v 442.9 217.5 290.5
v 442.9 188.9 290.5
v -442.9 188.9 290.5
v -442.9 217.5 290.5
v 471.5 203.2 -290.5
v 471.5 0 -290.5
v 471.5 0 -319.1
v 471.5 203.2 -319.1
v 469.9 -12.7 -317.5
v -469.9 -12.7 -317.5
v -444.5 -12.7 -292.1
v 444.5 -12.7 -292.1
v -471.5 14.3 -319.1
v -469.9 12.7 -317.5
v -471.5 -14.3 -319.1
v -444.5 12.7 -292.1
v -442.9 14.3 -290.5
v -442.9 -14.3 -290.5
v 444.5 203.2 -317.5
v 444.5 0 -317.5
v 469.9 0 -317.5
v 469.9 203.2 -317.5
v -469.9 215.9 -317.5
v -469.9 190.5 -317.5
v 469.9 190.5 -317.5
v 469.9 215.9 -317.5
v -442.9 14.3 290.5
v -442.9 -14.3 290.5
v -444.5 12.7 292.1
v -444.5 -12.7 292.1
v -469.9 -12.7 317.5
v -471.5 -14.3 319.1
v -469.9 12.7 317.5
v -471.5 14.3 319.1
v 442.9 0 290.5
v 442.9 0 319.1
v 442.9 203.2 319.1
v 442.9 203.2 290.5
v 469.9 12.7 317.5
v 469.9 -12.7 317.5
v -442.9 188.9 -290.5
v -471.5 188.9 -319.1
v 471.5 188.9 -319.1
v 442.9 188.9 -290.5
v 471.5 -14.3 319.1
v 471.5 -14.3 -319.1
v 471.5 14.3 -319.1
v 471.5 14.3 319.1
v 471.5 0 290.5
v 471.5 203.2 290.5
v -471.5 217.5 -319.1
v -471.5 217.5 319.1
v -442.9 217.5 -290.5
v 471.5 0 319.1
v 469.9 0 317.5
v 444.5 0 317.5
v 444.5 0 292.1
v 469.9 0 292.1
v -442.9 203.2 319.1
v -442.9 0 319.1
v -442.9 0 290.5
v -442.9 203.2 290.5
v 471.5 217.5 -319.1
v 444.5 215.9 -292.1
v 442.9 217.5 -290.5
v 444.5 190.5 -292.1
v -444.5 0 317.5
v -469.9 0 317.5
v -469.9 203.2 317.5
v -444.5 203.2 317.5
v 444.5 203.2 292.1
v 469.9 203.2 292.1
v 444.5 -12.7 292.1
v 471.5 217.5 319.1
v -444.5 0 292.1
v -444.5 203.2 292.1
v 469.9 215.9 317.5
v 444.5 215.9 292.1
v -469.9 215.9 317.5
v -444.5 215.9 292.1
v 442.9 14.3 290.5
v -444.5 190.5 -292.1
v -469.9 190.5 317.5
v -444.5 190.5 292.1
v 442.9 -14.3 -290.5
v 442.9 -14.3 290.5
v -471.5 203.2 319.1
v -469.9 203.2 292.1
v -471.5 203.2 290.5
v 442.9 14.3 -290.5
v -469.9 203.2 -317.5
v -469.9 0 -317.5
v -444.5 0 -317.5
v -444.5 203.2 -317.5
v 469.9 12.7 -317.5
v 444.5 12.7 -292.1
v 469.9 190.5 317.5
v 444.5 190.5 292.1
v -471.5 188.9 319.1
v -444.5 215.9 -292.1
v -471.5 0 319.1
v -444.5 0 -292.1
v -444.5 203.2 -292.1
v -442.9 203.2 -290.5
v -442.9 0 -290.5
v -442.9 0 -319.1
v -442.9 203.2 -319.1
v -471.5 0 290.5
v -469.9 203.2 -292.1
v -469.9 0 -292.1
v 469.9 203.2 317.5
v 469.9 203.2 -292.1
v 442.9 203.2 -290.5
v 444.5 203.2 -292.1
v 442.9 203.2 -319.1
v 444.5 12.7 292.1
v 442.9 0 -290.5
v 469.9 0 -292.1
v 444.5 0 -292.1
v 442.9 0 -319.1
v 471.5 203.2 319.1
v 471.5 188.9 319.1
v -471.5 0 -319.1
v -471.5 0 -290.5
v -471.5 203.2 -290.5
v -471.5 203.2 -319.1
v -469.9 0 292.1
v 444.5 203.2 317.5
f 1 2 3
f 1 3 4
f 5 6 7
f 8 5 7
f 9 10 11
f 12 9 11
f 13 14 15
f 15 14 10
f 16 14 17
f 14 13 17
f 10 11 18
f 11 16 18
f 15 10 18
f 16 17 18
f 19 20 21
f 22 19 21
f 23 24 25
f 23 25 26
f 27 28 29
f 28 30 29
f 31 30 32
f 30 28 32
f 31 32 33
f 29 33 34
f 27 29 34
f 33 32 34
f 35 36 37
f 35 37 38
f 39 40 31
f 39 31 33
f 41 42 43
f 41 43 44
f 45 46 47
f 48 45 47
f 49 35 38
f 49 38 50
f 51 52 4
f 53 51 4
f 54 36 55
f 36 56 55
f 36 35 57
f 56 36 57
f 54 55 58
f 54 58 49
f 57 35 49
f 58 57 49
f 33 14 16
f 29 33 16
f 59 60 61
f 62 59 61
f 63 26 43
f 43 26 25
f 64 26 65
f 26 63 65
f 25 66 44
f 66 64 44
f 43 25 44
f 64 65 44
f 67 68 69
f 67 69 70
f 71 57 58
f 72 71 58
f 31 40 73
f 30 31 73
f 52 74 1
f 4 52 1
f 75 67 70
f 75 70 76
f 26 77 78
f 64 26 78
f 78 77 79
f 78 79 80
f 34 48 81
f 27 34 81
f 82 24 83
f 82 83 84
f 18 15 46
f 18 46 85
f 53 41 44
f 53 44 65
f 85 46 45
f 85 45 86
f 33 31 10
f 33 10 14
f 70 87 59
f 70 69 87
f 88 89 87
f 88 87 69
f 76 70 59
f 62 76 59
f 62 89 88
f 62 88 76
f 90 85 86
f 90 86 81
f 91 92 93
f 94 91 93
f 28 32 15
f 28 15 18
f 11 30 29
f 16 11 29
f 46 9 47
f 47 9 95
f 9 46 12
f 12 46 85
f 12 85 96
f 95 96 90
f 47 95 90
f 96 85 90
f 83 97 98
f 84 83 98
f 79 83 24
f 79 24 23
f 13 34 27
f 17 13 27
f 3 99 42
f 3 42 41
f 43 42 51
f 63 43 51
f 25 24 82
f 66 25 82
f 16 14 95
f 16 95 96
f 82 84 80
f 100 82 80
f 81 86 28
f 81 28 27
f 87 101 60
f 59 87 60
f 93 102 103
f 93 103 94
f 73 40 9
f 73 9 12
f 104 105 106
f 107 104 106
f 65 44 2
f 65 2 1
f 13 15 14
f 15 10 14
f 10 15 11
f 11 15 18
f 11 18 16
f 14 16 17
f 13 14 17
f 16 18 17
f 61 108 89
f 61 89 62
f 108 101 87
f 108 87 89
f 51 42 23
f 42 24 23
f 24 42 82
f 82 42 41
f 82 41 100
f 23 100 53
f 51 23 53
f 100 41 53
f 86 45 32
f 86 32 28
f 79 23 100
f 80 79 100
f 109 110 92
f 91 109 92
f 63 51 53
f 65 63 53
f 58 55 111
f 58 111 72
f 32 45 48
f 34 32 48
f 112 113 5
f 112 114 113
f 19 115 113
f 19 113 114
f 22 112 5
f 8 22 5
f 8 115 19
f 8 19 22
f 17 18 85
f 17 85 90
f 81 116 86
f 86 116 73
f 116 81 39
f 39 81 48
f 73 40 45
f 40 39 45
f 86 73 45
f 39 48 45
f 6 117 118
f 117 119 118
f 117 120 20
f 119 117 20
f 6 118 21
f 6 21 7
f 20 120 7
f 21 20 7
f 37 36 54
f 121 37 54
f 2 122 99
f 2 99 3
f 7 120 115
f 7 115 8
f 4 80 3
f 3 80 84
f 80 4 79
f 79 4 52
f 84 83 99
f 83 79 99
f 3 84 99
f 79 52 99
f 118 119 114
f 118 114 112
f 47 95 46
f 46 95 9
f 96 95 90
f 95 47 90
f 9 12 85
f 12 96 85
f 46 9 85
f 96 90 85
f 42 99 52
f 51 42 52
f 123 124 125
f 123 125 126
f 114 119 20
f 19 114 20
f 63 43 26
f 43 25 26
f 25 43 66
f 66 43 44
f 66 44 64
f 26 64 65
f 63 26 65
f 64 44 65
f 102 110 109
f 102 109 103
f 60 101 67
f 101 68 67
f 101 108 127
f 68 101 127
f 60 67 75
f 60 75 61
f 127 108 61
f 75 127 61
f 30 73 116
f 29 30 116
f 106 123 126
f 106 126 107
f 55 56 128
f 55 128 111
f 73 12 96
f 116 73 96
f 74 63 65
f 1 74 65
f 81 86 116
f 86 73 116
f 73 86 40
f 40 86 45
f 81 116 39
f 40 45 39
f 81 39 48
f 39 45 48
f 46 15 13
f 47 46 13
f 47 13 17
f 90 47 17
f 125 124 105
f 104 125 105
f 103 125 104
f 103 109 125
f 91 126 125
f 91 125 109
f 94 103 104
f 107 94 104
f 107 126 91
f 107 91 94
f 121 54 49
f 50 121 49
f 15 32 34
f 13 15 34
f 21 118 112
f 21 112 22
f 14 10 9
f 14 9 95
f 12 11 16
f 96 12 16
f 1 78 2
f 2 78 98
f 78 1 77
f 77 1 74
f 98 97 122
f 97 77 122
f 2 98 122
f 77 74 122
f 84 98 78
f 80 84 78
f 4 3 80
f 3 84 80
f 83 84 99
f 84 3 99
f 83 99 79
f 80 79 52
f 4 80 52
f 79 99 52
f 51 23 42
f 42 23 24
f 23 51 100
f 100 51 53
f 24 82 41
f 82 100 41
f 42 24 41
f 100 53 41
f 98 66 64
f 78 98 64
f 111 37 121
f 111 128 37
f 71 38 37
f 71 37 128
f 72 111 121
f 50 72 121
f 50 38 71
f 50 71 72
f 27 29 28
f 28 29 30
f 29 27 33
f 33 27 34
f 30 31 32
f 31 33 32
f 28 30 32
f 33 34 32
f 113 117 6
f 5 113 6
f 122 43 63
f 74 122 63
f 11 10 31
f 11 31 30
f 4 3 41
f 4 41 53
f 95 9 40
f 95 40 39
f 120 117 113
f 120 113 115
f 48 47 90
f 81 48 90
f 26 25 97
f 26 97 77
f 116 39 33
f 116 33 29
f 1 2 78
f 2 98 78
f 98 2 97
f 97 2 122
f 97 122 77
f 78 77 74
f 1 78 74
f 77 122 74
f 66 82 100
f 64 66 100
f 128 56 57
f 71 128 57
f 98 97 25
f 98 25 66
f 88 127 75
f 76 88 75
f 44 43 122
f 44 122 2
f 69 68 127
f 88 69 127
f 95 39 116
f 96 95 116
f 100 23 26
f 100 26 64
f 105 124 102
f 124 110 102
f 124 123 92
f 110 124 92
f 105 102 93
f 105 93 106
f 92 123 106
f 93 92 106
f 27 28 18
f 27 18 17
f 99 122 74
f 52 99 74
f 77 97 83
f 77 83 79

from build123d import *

# Parameters (mm, degrees)
SQUARE_TUBE_25_4X25_4X1_6_IGVC_1_DEPTH      = 935.623253942
SQUARE_TUBE_25_4X25_4X1_6_IGVC_1_DEPTH_BACK = 21.223253942
SKETCH14_W                                  = 28.6
SKETCH14_H                                  = 28.6
SKETCH14_W_2                                = 25.4
SKETCH14_H_2                                = 25.4
SKETCH14_ON_SEGMENT_2_W                     = 28.6
SKETCH14_ON_SEGMENT_2_H                     = 28.6
SKETCH14_ON_SEGMENT_2_W_2                   = 25.4
SKETCH14_ON_SEGMENT_2_H_2                   = 25.4
SQUARE_TUBE_25_4X25_4X1_6_IGVC_1_2_DEPTH    = 652.046507884
SKETCH14_ON_SEGMENT_3_W                     = 28.6
SKETCH14_ON_SEGMENT_3_H                     = 28.6
SKETCH14_ON_SEGMENT_3_W_2                   = 25.4
SKETCH14_ON_SEGMENT_3_H_2                   = 25.4
SQUARE_TUBE_25_4X25_4X1_6_IGVC_1_3_DEPTH    = 956.846507884
SKETCH14_ON_SEGMENT_4_W                     = 28.6
SKETCH14_ON_SEGMENT_4_H                     = 28.6
SKETCH14_ON_SEGMENT_4_W_2                   = 25.4
SKETCH14_ON_SEGMENT_4_H_2                   = 25.4
SQUARE_TUBE_25_4X25_4X1_6_IGVC_1_4_DEPTH    = 652.046507884
SKETCH15_W                                  = 28.6
SKETCH15_H                                  = 28.6
SKETCH15_W_2                                = 25.4
SKETCH15_H_2                                = 25.4
SQUARE_TUBE_25_4X25_4X1_6_IGVC_2_DEPTH      = 203.2
SKETCH15_ON_SEGMENT_2_W                     = 28.6
SKETCH15_ON_SEGMENT_2_H                     = 28.6
SKETCH15_ON_SEGMENT_2_W_2                   = 25.4
SKETCH15_ON_SEGMENT_2_H_2                   = 25.4
SQUARE_TUBE_25_4X25_4X1_6_IGVC_2_2_DEPTH    = 203.2
SKETCH15_ON_SEGMENT_3_W                     = 28.6
SKETCH15_ON_SEGMENT_3_H                     = 28.6
SKETCH15_ON_SEGMENT_3_W_2                   = 25.4
SKETCH15_ON_SEGMENT_3_H_2                   = 25.4
SQUARE_TUBE_25_4X25_4X1_6_IGVC_2_3_DEPTH    = 203.2
SKETCH15_ON_SEGMENT_4_W                     = 28.6
SKETCH15_ON_SEGMENT_4_H                     = 28.6
SKETCH15_ON_SEGMENT_4_W_2                   = 25.4
SKETCH15_ON_SEGMENT_4_H_2                   = 25.4
SQUARE_TUBE_25_4X25_4X1_6_IGVC_2_4_DEPTH    = 203.2
SQUARE_TUBE_25_4X25_4X1_6_IGVC_3_DEPTH      = 630.823253942
SQUARE_TUBE_25_4X25_4X1_6_IGVC_3_DEPTH_BACK = 21.223253942
SKETCH16_W                                  = 28.6
SKETCH16_H                                  = 28.6
SKETCH16_W_2                                = 25.4
SKETCH16_H_2                                = 25.4
SKETCH16_ON_SEGMENT_2_W                     = 28.6
SKETCH16_ON_SEGMENT_2_H                     = 28.6
SKETCH16_ON_SEGMENT_2_W_2                   = 25.4
SKETCH16_ON_SEGMENT_2_H_2                   = 25.4
SQUARE_TUBE_25_4X25_4X1_6_IGVC_3_2_DEPTH    = 956.846507884
SKETCH16_ON_SEGMENT_3_W                     = 28.6
SKETCH16_ON_SEGMENT_3_H                     = 28.6
SKETCH16_ON_SEGMENT_3_W_2                   = 25.4
SKETCH16_ON_SEGMENT_3_H_2                   = 25.4
SQUARE_TUBE_25_4X25_4X1_6_IGVC_3_3_DEPTH    = 652.046507884
SKETCH16_ON_SEGMENT_4_W                     = 28.6
SKETCH16_ON_SEGMENT_4_H                     = 28.6
SKETCH16_ON_SEGMENT_4_W_2                   = 25.4
SKETCH16_ON_SEGMENT_4_H_2                   = 25.4
SQUARE_TUBE_25_4X25_4X1_6_IGVC_3_4_DEPTH    = 956.846507884


with BuildPart() as part:
    # Sketch14 → Square tube 25.4X25.4X1.6_IGVC(1) (new, two sides: drawn at the far end of the back side and taken through both)
    with BuildSketch(Plane(origin=(-457.2, 0, 304.8), x_dir=(0, 0, -1), z_dir=(1, 0, 0)).offset(-SQUARE_TUBE_25_4X25_4X1_6_IGVC_1_DEPTH_BACK)):
        Rectangle(SKETCH14_W, SKETCH14_H)
        Rectangle(SKETCH14_W_2, SKETCH14_H_2, mode=Mode.SUBTRACT)
    extrude(amount=SQUARE_TUBE_25_4X25_4X1_6_IGVC_1_DEPTH + SQUARE_TUBE_25_4X25_4X1_6_IGVC_1_DEPTH_BACK)

    # Square tube 25.4X25.4X1.6_IGVC(1) mitre 1
    split(bisect_by=Plane(origin=(-457.2, 0, 304.8), x_dir=(0, 1, 0), z_dir=(0.707106781, 0, 0.707106781)), keep=Keep.TOP)

    # Square tube 25.4X25.4X1.6_IGVC(1) mitre 2
    split(bisect_by=Plane(origin=(457.2, 0, 304.8), x_dir=(0, -1, 0), z_dir=(-0.707106781, 0, 0.707106781)), keep=Keep.TOP)


with BuildPart() as body_2:
    # Sketch14 on segment 2 (carried to segment 2) → Square tube 25.4X25.4X1.6_IGVC_1 2 (new body)
    with BuildSketch(Plane(origin=(457.2, 0, 326.023253942), x_dir=(-1, 0, 0), z_dir=(0, 0, -1))):
        Rectangle(SKETCH14_ON_SEGMENT_2_W, SKETCH14_ON_SEGMENT_2_H)
        Rectangle(SKETCH14_ON_SEGMENT_2_W_2, SKETCH14_ON_SEGMENT_2_H_2, mode=Mode.SUBTRACT)
    extrude(amount=SQUARE_TUBE_25_4X25_4X1_6_IGVC_1_2_DEPTH)

    # Square tube 25.4X25.4X1.6_IGVC_1 2 mitre
    split(bisect_by=Plane(origin=(457.2, 0, -304.8), x_dir=(0, 1, 0), z_dir=(0.707106781, 0, 0.707106781)), keep=Keep.TOP)

    # Square tube 25.4X25.4X1.6_IGVC_1 2 m 2
    split(bisect_by=Plane(origin=(457.2, 0, 304.8), x_dir=(0, 1, 0), z_dir=(0.707106781, 0, -0.707106781)), keep=Keep.TOP)


with BuildPart() as body_3:
    # Sketch14 on segment 3 (carried to segment 3) → Square tube 25.4X25.4X1.6_IGVC_1 3 (new body)
    with BuildSketch(Plane(origin=(478.423253942, 0, -304.8), x_dir=(0, 0, 1), z_dir=(-1, 0, 0))):
        Rectangle(SKETCH14_ON_SEGMENT_3_W, SKETCH14_ON_SEGMENT_3_H)
        Rectangle(SKETCH14_ON_SEGMENT_3_W_2, SKETCH14_ON_SEGMENT_3_H_2, mode=Mode.SUBTRACT)
    extrude(amount=SQUARE_TUBE_25_4X25_4X1_6_IGVC_1_3_DEPTH)

    # Square tube 25.4X25.4X1.6_IGVC_1 3 mitre
    split(bisect_by=Plane(origin=(-457.2, 0, -304.8), x_dir=(0, 1, 0), z_dir=(0.707106781, 0, -0.707106781)), keep=Keep.TOP)

    # Square tube 25.4X25.4X1.6_IGVC_1 3 m 2
    split(bisect_by=Plane(origin=(457.2, 0, -304.8), x_dir=(0, -1, 0), z_dir=(-0.707106781, 0, -0.707106781)), keep=Keep.TOP)


with BuildPart() as body_4:
    # Sketch14 on segment 4 (carried to segment 4) → Square tube 25.4X25.4X1.6_IGVC_1 4 (new body)
    with BuildSketch(Plane(origin=(-457.2, 0, -326.023253942), x_dir=(1, 0, 0), z_dir=(0, 0, 1))):
        Rectangle(SKETCH14_ON_SEGMENT_4_W, SKETCH14_ON_SEGMENT_4_H)
        Rectangle(SKETCH14_ON_SEGMENT_4_W_2, SKETCH14_ON_SEGMENT_4_H_2, mode=Mode.SUBTRACT)
    extrude(amount=SQUARE_TUBE_25_4X25_4X1_6_IGVC_1_4_DEPTH)

    # Square tube 25.4X25.4X1.6_IGVC_1 4 mitre
    split(bisect_by=Plane(origin=(-457.2, 0, -304.8), x_dir=(0, -1, 0), z_dir=(-0.707106781, 0, 0.707106781)), keep=Keep.TOP)

    # Square tube 25.4X25.4X1.6_IGVC_1 4 m 2
    split(bisect_by=Plane(origin=(-457.2, 0, 304.8), x_dir=(0, -1, 0), z_dir=(-0.707106781, 0, -0.707106781)), keep=Keep.TOP)


with BuildPart() as body_5:
    # Sketch15 → Square tube 25.4X25.4X1.6_IGVC(2) (new body)
    with BuildSketch(Plane(origin=(-457.2, 0, 304.8), x_dir=(1, 0, 0), z_dir=(0, 1, 0))):
        Rectangle(SKETCH15_W, SKETCH15_H)
        Rectangle(SKETCH15_W_2, SKETCH15_H_2, mode=Mode.SUBTRACT)
    extrude(amount=SQUARE_TUBE_25_4X25_4X1_6_IGVC_2_DEPTH)


with BuildPart() as body_6:
    # Sketch15 on segment 2 (carried to segment 2) → Square tube 25.4X25.4X1.6_IGVC_2 2 (new body)
    with BuildSketch(Plane(origin=(457.2, 0, 304.8), x_dir=(1, 0, 0), z_dir=(0, 1, 0))):
        Rectangle(SKETCH15_ON_SEGMENT_2_W, SKETCH15_ON_SEGMENT_2_H)
        Rectangle(SKETCH15_ON_SEGMENT_2_W_2, SKETCH15_ON_SEGMENT_2_H_2, mode=Mode.SUBTRACT)
    extrude(amount=SQUARE_TUBE_25_4X25_4X1_6_IGVC_2_2_DEPTH)


with BuildPart() as body_7:
    # Sketch15 on segment 3 (carried to segment 3) → Square tube 25.4X25.4X1.6_IGVC_2 3 (new body)
    with BuildSketch(Plane(origin=(457.2, 0, -304.8), x_dir=(1, 0, 0), z_dir=(0, 1, 0))):
        Rectangle(SKETCH15_ON_SEGMENT_3_W, SKETCH15_ON_SEGMENT_3_H)
        Rectangle(SKETCH15_ON_SEGMENT_3_W_2, SKETCH15_ON_SEGMENT_3_H_2, mode=Mode.SUBTRACT)
    extrude(amount=SQUARE_TUBE_25_4X25_4X1_6_IGVC_2_3_DEPTH)


with BuildPart() as body_8:
    # Sketch15 on segment 4 (carried to segment 4) → Square tube 25.4X25.4X1.6_IGVC_2 4 (new body)
    with BuildSketch(Plane(origin=(-457.2, 0, -304.8), x_dir=(1, 0, 0), z_dir=(0, 1, 0))):
        Rectangle(SKETCH15_ON_SEGMENT_4_W, SKETCH15_ON_SEGMENT_4_H)
        Rectangle(SKETCH15_ON_SEGMENT_4_W_2, SKETCH15_ON_SEGMENT_4_H_2, mode=Mode.SUBTRACT)
    extrude(amount=SQUARE_TUBE_25_4X25_4X1_6_IGVC_2_4_DEPTH)


with BuildPart() as body_9:
    # Sketch16 → Square tube 25.4X25.4X1.6_IGVC(3) (new, two sides: drawn at the far end of the back side and taken through both)
    with BuildSketch(Plane(origin=(-457.2, 203.2, -304.8), x_dir=(1, 0, 0), z_dir=(0, 0, 1)).offset(-SQUARE_TUBE_25_4X25_4X1_6_IGVC_3_DEPTH_BACK)):
        Rectangle(SKETCH16_W, SKETCH16_H)
        Rectangle(SKETCH16_W_2, SKETCH16_H_2, mode=Mode.SUBTRACT)
    extrude(amount=SQUARE_TUBE_25_4X25_4X1_6_IGVC_3_DEPTH + SQUARE_TUBE_25_4X25_4X1_6_IGVC_3_DEPTH_BACK)

    # Square tube 25.4X25.4X1.6_IGVC(3) mitre 1
    split(bisect_by=Plane(origin=(-457.2, 203.2, -304.8), x_dir=(0, -1, 0), z_dir=(-0.707106781, 0, 0.707106781)), keep=Keep.TOP)

    # Square tube 25.4X25.4X1.6_IGVC(3) mitre 2
    split(bisect_by=Plane(origin=(-457.2, 203.2, 304.8), x_dir=(0, -1, 0), z_dir=(-0.707106781, 0, -0.707106781)), keep=Keep.TOP)


with BuildPart() as body_10:
    # Sketch16 on segment 2 (carried to segment 2) → Square tube 25.4X25.4X1.6_IGVC_3 2 (new body)
    with BuildSketch(Plane(origin=(-478.423253942, 203.2, 304.8), x_dir=(0, 0, -1), z_dir=(1, 0, 0))):
        Rectangle(SKETCH16_ON_SEGMENT_2_W, SKETCH16_ON_SEGMENT_2_H)
        Rectangle(SKETCH16_ON_SEGMENT_2_W_2, SKETCH16_ON_SEGMENT_2_H_2, mode=Mode.SUBTRACT)
    extrude(amount=SQUARE_TUBE_25_4X25_4X1_6_IGVC_3_2_DEPTH)

    # Square tube 25.4X25.4X1.6_IGVC_3 2 mitre
    split(bisect_by=Plane(origin=(-457.2, 203.2, 304.8), x_dir=(0, 1, 0), z_dir=(0.707106781, 0, 0.707106781)), keep=Keep.TOP)

    # Square tube 25.4X25.4X1.6_IGVC_3 2 m 2
    split(bisect_by=Plane(origin=(457.2, 203.2, 304.8), x_dir=(0, -1, 0), z_dir=(-0.707106781, 0, 0.707106781)), keep=Keep.TOP)


with BuildPart() as body_11:
    # Sketch16 on segment 3 (carried to segment 3) → Square tube 25.4X25.4X1.6_IGVC_3 3 (new body)
    with BuildSketch(Plane(origin=(457.2, 203.2, 326.023253942), x_dir=(-1, 0, 0), z_dir=(0, 0, -1))):
        Rectangle(SKETCH16_ON_SEGMENT_3_W, SKETCH16_ON_SEGMENT_3_H)
        Rectangle(SKETCH16_ON_SEGMENT_3_W_2, SKETCH16_ON_SEGMENT_3_H_2, mode=Mode.SUBTRACT)
    extrude(amount=SQUARE_TUBE_25_4X25_4X1_6_IGVC_3_3_DEPTH)

    # Square tube 25.4X25.4X1.6_IGVC_3 3 mitre
    split(bisect_by=Plane(origin=(457.2, 203.2, -304.8), x_dir=(0, 1, 0), z_dir=(0.707106781, 0, 0.707106781)), keep=Keep.TOP)

    # Square tube 25.4X25.4X1.6_IGVC_3 3 m 2
    split(bisect_by=Plane(origin=(457.2, 203.2, 304.8), x_dir=(0, 1, 0), z_dir=(0.707106781, 0, -0.707106781)), keep=Keep.TOP)


with BuildPart() as body_12:
    # Sketch16 on segment 4 (carried to segment 4) → Square tube 25.4X25.4X1.6_IGVC_3 4 (new body)
    with BuildSketch(Plane(origin=(478.423253942, 203.2, -304.8), x_dir=(0, 0, 1), z_dir=(-1, 0, 0))):
        Rectangle(SKETCH16_ON_SEGMENT_4_W, SKETCH16_ON_SEGMENT_4_H)
        Rectangle(SKETCH16_ON_SEGMENT_4_W_2, SKETCH16_ON_SEGMENT_4_H_2, mode=Mode.SUBTRACT)
    extrude(amount=SQUARE_TUBE_25_4X25_4X1_6_IGVC_3_4_DEPTH)

    # Square tube 25.4X25.4X1.6_IGVC_3 4 mitre
    split(bisect_by=Plane(origin=(-457.2, 203.2, -304.8), x_dir=(0, 1, 0), z_dir=(0.707106781, 0, -0.707106781)), keep=Keep.TOP)

    # Square tube 25.4X25.4X1.6_IGVC_3 4 m 2
    split(bisect_by=Plane(origin=(457.2, 203.2, -304.8), x_dir=(0, -1, 0), z_dir=(-0.707106781, 0, -0.707106781)), keep=Keep.TOP)


solid = Compound([part.part, body_2.part, body_3.part, body_4.part, body_5.part, body_6.part, body_7.part, body_8.part, body_9.part, body_10.part, body_11.part, body_12.part])
